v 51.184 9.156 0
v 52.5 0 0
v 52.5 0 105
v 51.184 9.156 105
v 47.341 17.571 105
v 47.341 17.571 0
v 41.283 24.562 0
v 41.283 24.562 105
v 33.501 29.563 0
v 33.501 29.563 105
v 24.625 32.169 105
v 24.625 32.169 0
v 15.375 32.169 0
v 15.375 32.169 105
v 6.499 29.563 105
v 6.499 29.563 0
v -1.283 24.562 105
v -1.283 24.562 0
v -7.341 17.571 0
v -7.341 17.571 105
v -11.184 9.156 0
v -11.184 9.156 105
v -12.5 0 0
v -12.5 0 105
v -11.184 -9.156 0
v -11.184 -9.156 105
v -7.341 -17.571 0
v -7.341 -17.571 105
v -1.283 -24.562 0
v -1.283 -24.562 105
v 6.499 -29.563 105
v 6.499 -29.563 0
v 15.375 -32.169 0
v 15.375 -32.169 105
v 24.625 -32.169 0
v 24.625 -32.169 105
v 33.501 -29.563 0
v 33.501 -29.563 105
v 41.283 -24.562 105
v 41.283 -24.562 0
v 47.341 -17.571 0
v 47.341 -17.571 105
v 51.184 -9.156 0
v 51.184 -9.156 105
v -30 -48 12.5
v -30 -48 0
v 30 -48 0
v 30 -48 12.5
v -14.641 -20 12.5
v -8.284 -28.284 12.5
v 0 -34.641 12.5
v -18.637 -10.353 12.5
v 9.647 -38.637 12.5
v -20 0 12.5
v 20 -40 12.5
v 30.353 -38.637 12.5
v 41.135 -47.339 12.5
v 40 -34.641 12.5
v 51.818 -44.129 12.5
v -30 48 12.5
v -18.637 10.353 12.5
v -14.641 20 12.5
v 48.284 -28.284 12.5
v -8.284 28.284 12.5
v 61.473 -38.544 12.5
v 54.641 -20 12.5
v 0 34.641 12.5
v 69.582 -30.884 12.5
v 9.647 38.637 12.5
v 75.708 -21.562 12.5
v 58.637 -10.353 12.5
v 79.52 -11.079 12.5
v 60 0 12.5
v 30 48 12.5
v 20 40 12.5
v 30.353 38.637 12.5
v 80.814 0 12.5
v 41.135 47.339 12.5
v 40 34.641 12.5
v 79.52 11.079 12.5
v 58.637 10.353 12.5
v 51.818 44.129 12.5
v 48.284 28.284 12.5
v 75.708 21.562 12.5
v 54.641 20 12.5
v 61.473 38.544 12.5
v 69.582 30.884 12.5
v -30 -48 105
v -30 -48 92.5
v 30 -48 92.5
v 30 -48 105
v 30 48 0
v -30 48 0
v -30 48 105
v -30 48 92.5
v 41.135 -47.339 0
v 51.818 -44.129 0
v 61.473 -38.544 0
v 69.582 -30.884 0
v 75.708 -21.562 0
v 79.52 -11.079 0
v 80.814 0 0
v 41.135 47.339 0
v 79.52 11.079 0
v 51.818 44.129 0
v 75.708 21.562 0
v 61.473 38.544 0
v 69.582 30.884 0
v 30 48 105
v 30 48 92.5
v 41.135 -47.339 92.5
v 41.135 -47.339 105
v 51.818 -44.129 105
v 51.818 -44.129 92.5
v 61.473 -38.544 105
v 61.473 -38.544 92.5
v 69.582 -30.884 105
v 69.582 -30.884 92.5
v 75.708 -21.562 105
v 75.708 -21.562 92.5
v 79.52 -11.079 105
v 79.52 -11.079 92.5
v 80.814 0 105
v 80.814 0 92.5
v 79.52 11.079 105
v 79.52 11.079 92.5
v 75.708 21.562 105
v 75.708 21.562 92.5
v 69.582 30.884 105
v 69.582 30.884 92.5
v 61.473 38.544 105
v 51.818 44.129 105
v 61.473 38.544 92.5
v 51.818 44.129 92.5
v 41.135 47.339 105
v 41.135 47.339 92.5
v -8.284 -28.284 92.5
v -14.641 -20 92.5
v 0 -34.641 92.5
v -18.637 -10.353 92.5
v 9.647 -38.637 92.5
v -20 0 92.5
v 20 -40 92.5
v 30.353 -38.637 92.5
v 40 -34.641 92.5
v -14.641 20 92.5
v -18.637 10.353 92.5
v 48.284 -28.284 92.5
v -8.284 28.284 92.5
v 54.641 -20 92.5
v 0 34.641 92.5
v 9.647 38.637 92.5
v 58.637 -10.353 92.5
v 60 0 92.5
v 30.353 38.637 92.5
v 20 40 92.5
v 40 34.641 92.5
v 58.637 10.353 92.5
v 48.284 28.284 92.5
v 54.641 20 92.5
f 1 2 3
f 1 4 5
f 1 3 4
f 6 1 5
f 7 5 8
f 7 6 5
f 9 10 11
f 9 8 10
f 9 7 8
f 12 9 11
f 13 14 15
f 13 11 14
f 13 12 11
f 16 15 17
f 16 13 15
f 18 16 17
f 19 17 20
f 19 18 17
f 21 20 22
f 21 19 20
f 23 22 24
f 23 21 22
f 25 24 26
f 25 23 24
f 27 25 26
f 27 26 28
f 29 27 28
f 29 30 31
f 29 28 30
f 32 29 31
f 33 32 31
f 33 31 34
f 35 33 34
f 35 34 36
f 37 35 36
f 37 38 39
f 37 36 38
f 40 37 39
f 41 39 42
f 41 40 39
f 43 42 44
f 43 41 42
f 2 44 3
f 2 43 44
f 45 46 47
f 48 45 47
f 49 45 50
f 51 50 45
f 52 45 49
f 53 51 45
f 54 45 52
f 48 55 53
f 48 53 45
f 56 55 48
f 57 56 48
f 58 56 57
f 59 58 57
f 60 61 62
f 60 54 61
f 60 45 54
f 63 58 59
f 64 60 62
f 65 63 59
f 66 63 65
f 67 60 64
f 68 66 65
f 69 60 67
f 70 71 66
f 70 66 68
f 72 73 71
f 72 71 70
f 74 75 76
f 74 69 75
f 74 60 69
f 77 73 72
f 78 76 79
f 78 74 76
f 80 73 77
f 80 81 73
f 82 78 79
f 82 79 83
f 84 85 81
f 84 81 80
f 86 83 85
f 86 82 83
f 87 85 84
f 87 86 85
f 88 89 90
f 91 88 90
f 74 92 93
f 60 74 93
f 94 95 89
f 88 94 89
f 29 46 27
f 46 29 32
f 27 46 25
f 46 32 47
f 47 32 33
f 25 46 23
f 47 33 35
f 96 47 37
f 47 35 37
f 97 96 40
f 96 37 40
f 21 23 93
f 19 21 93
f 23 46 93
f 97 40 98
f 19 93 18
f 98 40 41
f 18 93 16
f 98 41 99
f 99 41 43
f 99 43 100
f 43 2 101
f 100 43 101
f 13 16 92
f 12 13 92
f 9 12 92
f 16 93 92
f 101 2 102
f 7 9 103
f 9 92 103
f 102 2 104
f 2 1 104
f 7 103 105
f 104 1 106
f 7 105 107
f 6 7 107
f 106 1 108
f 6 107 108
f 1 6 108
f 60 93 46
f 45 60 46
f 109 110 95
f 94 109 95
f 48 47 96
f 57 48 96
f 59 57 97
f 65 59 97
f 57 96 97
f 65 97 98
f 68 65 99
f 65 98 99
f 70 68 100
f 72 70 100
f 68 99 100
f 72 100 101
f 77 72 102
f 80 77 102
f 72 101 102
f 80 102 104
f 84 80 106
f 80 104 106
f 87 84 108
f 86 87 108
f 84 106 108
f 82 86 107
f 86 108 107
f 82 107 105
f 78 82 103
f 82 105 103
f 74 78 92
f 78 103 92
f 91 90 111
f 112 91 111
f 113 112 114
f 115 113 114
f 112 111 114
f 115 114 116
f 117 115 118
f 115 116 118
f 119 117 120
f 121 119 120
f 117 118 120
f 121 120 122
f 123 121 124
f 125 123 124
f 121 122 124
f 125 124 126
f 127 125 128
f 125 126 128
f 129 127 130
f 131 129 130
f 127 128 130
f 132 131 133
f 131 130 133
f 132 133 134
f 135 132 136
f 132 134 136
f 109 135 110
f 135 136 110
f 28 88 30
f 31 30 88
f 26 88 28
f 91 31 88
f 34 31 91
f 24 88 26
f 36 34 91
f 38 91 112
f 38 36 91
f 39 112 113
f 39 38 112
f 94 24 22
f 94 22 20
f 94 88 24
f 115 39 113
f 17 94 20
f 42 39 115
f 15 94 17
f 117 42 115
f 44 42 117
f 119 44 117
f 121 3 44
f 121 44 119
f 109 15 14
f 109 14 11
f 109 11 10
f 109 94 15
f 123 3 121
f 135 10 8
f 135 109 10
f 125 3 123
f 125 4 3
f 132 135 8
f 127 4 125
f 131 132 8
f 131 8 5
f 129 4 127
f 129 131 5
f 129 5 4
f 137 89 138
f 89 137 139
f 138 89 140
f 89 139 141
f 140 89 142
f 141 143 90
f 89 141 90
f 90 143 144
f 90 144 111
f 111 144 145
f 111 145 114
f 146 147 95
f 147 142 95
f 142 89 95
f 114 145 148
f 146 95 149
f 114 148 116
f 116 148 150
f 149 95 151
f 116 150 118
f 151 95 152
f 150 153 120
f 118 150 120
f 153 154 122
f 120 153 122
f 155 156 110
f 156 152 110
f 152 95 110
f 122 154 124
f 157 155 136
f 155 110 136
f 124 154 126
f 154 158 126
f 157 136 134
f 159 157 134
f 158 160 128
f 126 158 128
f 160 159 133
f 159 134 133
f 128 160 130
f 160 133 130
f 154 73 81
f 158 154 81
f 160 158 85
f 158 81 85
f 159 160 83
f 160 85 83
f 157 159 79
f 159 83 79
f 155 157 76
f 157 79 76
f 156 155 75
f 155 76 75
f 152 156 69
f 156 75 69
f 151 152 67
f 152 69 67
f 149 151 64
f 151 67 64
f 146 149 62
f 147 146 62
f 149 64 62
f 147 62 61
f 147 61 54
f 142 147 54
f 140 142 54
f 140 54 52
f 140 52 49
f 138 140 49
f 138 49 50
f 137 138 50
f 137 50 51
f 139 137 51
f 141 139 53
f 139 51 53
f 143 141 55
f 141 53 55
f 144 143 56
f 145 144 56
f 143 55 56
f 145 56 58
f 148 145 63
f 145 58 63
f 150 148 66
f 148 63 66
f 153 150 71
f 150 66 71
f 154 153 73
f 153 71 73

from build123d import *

# Parameters (mm, degrees)
BOSS_EXTRUDE1_DEPTH     = 12.5
SKETCH2_R               = 40
BOSS_EXTRUDE2_DEPTH     = 80
BOSS_EXTRUDE3_DEPTH     = 12.5
CUT_EXTRUDE2_DEPTH      = 132.903899543
CUT_EXTRUDE2_DEPTH_BACK = 132.903899543
SKETCH6_R               = 32.5


with BuildPart() as part:
    # Sketch1 → Boss-Extrude1 (new body)
    with BuildSketch(Plane.XY):
        with BuildLine():
            Line((-30, -48), (30, -48))
            ThreePointArc((30, -48), (80.813999827, 0), (30, 48))
            Line((30, 48), (-30, 48))
            Line((-30, 48), (-30, -48))
        make_face()
    extrude(amount=BOSS_EXTRUDE1_DEPTH)

    # Sketch2 → Boss-Extrude2 (add)
    with BuildSketch(Plane.XY.offset(12.5)):
        with Locations((20, 0)):
            Circle(SKETCH2_R)
    extrude(amount=BOSS_EXTRUDE2_DEPTH)

    # Sketch3 → Boss-Extrude3 (add)
    with BuildSketch(Plane.XY.offset(92.5)):
        with BuildLine():
            Line((-30, 48), (-30, -48))
            Line((-30, -48), (30, -48))
            ThreePointArc((30, -48), (80.813999827, 0), (30, 48))
            Line((30, 48), (-30, 48))
        make_face()
    extrude(amount=BOSS_EXTRUDE3_DEPTH)

    # Sketch6 → Cut-Extrude2 (cut, two sides: drawn at the far end of the back side and taken through both)
    with BuildSketch(Plane.XY.offset(12.5).offset(-CUT_EXTRUDE2_DEPTH_BACK)):
        with Locations((20, 0)):
            Circle(SKETCH6_R)
    extrude(amount=CUT_EXTRUDE2_DEPTH + CUT_EXTRUDE2_DEPTH_BACK, mode=Mode.SUBTRACT)


solid = part.part
